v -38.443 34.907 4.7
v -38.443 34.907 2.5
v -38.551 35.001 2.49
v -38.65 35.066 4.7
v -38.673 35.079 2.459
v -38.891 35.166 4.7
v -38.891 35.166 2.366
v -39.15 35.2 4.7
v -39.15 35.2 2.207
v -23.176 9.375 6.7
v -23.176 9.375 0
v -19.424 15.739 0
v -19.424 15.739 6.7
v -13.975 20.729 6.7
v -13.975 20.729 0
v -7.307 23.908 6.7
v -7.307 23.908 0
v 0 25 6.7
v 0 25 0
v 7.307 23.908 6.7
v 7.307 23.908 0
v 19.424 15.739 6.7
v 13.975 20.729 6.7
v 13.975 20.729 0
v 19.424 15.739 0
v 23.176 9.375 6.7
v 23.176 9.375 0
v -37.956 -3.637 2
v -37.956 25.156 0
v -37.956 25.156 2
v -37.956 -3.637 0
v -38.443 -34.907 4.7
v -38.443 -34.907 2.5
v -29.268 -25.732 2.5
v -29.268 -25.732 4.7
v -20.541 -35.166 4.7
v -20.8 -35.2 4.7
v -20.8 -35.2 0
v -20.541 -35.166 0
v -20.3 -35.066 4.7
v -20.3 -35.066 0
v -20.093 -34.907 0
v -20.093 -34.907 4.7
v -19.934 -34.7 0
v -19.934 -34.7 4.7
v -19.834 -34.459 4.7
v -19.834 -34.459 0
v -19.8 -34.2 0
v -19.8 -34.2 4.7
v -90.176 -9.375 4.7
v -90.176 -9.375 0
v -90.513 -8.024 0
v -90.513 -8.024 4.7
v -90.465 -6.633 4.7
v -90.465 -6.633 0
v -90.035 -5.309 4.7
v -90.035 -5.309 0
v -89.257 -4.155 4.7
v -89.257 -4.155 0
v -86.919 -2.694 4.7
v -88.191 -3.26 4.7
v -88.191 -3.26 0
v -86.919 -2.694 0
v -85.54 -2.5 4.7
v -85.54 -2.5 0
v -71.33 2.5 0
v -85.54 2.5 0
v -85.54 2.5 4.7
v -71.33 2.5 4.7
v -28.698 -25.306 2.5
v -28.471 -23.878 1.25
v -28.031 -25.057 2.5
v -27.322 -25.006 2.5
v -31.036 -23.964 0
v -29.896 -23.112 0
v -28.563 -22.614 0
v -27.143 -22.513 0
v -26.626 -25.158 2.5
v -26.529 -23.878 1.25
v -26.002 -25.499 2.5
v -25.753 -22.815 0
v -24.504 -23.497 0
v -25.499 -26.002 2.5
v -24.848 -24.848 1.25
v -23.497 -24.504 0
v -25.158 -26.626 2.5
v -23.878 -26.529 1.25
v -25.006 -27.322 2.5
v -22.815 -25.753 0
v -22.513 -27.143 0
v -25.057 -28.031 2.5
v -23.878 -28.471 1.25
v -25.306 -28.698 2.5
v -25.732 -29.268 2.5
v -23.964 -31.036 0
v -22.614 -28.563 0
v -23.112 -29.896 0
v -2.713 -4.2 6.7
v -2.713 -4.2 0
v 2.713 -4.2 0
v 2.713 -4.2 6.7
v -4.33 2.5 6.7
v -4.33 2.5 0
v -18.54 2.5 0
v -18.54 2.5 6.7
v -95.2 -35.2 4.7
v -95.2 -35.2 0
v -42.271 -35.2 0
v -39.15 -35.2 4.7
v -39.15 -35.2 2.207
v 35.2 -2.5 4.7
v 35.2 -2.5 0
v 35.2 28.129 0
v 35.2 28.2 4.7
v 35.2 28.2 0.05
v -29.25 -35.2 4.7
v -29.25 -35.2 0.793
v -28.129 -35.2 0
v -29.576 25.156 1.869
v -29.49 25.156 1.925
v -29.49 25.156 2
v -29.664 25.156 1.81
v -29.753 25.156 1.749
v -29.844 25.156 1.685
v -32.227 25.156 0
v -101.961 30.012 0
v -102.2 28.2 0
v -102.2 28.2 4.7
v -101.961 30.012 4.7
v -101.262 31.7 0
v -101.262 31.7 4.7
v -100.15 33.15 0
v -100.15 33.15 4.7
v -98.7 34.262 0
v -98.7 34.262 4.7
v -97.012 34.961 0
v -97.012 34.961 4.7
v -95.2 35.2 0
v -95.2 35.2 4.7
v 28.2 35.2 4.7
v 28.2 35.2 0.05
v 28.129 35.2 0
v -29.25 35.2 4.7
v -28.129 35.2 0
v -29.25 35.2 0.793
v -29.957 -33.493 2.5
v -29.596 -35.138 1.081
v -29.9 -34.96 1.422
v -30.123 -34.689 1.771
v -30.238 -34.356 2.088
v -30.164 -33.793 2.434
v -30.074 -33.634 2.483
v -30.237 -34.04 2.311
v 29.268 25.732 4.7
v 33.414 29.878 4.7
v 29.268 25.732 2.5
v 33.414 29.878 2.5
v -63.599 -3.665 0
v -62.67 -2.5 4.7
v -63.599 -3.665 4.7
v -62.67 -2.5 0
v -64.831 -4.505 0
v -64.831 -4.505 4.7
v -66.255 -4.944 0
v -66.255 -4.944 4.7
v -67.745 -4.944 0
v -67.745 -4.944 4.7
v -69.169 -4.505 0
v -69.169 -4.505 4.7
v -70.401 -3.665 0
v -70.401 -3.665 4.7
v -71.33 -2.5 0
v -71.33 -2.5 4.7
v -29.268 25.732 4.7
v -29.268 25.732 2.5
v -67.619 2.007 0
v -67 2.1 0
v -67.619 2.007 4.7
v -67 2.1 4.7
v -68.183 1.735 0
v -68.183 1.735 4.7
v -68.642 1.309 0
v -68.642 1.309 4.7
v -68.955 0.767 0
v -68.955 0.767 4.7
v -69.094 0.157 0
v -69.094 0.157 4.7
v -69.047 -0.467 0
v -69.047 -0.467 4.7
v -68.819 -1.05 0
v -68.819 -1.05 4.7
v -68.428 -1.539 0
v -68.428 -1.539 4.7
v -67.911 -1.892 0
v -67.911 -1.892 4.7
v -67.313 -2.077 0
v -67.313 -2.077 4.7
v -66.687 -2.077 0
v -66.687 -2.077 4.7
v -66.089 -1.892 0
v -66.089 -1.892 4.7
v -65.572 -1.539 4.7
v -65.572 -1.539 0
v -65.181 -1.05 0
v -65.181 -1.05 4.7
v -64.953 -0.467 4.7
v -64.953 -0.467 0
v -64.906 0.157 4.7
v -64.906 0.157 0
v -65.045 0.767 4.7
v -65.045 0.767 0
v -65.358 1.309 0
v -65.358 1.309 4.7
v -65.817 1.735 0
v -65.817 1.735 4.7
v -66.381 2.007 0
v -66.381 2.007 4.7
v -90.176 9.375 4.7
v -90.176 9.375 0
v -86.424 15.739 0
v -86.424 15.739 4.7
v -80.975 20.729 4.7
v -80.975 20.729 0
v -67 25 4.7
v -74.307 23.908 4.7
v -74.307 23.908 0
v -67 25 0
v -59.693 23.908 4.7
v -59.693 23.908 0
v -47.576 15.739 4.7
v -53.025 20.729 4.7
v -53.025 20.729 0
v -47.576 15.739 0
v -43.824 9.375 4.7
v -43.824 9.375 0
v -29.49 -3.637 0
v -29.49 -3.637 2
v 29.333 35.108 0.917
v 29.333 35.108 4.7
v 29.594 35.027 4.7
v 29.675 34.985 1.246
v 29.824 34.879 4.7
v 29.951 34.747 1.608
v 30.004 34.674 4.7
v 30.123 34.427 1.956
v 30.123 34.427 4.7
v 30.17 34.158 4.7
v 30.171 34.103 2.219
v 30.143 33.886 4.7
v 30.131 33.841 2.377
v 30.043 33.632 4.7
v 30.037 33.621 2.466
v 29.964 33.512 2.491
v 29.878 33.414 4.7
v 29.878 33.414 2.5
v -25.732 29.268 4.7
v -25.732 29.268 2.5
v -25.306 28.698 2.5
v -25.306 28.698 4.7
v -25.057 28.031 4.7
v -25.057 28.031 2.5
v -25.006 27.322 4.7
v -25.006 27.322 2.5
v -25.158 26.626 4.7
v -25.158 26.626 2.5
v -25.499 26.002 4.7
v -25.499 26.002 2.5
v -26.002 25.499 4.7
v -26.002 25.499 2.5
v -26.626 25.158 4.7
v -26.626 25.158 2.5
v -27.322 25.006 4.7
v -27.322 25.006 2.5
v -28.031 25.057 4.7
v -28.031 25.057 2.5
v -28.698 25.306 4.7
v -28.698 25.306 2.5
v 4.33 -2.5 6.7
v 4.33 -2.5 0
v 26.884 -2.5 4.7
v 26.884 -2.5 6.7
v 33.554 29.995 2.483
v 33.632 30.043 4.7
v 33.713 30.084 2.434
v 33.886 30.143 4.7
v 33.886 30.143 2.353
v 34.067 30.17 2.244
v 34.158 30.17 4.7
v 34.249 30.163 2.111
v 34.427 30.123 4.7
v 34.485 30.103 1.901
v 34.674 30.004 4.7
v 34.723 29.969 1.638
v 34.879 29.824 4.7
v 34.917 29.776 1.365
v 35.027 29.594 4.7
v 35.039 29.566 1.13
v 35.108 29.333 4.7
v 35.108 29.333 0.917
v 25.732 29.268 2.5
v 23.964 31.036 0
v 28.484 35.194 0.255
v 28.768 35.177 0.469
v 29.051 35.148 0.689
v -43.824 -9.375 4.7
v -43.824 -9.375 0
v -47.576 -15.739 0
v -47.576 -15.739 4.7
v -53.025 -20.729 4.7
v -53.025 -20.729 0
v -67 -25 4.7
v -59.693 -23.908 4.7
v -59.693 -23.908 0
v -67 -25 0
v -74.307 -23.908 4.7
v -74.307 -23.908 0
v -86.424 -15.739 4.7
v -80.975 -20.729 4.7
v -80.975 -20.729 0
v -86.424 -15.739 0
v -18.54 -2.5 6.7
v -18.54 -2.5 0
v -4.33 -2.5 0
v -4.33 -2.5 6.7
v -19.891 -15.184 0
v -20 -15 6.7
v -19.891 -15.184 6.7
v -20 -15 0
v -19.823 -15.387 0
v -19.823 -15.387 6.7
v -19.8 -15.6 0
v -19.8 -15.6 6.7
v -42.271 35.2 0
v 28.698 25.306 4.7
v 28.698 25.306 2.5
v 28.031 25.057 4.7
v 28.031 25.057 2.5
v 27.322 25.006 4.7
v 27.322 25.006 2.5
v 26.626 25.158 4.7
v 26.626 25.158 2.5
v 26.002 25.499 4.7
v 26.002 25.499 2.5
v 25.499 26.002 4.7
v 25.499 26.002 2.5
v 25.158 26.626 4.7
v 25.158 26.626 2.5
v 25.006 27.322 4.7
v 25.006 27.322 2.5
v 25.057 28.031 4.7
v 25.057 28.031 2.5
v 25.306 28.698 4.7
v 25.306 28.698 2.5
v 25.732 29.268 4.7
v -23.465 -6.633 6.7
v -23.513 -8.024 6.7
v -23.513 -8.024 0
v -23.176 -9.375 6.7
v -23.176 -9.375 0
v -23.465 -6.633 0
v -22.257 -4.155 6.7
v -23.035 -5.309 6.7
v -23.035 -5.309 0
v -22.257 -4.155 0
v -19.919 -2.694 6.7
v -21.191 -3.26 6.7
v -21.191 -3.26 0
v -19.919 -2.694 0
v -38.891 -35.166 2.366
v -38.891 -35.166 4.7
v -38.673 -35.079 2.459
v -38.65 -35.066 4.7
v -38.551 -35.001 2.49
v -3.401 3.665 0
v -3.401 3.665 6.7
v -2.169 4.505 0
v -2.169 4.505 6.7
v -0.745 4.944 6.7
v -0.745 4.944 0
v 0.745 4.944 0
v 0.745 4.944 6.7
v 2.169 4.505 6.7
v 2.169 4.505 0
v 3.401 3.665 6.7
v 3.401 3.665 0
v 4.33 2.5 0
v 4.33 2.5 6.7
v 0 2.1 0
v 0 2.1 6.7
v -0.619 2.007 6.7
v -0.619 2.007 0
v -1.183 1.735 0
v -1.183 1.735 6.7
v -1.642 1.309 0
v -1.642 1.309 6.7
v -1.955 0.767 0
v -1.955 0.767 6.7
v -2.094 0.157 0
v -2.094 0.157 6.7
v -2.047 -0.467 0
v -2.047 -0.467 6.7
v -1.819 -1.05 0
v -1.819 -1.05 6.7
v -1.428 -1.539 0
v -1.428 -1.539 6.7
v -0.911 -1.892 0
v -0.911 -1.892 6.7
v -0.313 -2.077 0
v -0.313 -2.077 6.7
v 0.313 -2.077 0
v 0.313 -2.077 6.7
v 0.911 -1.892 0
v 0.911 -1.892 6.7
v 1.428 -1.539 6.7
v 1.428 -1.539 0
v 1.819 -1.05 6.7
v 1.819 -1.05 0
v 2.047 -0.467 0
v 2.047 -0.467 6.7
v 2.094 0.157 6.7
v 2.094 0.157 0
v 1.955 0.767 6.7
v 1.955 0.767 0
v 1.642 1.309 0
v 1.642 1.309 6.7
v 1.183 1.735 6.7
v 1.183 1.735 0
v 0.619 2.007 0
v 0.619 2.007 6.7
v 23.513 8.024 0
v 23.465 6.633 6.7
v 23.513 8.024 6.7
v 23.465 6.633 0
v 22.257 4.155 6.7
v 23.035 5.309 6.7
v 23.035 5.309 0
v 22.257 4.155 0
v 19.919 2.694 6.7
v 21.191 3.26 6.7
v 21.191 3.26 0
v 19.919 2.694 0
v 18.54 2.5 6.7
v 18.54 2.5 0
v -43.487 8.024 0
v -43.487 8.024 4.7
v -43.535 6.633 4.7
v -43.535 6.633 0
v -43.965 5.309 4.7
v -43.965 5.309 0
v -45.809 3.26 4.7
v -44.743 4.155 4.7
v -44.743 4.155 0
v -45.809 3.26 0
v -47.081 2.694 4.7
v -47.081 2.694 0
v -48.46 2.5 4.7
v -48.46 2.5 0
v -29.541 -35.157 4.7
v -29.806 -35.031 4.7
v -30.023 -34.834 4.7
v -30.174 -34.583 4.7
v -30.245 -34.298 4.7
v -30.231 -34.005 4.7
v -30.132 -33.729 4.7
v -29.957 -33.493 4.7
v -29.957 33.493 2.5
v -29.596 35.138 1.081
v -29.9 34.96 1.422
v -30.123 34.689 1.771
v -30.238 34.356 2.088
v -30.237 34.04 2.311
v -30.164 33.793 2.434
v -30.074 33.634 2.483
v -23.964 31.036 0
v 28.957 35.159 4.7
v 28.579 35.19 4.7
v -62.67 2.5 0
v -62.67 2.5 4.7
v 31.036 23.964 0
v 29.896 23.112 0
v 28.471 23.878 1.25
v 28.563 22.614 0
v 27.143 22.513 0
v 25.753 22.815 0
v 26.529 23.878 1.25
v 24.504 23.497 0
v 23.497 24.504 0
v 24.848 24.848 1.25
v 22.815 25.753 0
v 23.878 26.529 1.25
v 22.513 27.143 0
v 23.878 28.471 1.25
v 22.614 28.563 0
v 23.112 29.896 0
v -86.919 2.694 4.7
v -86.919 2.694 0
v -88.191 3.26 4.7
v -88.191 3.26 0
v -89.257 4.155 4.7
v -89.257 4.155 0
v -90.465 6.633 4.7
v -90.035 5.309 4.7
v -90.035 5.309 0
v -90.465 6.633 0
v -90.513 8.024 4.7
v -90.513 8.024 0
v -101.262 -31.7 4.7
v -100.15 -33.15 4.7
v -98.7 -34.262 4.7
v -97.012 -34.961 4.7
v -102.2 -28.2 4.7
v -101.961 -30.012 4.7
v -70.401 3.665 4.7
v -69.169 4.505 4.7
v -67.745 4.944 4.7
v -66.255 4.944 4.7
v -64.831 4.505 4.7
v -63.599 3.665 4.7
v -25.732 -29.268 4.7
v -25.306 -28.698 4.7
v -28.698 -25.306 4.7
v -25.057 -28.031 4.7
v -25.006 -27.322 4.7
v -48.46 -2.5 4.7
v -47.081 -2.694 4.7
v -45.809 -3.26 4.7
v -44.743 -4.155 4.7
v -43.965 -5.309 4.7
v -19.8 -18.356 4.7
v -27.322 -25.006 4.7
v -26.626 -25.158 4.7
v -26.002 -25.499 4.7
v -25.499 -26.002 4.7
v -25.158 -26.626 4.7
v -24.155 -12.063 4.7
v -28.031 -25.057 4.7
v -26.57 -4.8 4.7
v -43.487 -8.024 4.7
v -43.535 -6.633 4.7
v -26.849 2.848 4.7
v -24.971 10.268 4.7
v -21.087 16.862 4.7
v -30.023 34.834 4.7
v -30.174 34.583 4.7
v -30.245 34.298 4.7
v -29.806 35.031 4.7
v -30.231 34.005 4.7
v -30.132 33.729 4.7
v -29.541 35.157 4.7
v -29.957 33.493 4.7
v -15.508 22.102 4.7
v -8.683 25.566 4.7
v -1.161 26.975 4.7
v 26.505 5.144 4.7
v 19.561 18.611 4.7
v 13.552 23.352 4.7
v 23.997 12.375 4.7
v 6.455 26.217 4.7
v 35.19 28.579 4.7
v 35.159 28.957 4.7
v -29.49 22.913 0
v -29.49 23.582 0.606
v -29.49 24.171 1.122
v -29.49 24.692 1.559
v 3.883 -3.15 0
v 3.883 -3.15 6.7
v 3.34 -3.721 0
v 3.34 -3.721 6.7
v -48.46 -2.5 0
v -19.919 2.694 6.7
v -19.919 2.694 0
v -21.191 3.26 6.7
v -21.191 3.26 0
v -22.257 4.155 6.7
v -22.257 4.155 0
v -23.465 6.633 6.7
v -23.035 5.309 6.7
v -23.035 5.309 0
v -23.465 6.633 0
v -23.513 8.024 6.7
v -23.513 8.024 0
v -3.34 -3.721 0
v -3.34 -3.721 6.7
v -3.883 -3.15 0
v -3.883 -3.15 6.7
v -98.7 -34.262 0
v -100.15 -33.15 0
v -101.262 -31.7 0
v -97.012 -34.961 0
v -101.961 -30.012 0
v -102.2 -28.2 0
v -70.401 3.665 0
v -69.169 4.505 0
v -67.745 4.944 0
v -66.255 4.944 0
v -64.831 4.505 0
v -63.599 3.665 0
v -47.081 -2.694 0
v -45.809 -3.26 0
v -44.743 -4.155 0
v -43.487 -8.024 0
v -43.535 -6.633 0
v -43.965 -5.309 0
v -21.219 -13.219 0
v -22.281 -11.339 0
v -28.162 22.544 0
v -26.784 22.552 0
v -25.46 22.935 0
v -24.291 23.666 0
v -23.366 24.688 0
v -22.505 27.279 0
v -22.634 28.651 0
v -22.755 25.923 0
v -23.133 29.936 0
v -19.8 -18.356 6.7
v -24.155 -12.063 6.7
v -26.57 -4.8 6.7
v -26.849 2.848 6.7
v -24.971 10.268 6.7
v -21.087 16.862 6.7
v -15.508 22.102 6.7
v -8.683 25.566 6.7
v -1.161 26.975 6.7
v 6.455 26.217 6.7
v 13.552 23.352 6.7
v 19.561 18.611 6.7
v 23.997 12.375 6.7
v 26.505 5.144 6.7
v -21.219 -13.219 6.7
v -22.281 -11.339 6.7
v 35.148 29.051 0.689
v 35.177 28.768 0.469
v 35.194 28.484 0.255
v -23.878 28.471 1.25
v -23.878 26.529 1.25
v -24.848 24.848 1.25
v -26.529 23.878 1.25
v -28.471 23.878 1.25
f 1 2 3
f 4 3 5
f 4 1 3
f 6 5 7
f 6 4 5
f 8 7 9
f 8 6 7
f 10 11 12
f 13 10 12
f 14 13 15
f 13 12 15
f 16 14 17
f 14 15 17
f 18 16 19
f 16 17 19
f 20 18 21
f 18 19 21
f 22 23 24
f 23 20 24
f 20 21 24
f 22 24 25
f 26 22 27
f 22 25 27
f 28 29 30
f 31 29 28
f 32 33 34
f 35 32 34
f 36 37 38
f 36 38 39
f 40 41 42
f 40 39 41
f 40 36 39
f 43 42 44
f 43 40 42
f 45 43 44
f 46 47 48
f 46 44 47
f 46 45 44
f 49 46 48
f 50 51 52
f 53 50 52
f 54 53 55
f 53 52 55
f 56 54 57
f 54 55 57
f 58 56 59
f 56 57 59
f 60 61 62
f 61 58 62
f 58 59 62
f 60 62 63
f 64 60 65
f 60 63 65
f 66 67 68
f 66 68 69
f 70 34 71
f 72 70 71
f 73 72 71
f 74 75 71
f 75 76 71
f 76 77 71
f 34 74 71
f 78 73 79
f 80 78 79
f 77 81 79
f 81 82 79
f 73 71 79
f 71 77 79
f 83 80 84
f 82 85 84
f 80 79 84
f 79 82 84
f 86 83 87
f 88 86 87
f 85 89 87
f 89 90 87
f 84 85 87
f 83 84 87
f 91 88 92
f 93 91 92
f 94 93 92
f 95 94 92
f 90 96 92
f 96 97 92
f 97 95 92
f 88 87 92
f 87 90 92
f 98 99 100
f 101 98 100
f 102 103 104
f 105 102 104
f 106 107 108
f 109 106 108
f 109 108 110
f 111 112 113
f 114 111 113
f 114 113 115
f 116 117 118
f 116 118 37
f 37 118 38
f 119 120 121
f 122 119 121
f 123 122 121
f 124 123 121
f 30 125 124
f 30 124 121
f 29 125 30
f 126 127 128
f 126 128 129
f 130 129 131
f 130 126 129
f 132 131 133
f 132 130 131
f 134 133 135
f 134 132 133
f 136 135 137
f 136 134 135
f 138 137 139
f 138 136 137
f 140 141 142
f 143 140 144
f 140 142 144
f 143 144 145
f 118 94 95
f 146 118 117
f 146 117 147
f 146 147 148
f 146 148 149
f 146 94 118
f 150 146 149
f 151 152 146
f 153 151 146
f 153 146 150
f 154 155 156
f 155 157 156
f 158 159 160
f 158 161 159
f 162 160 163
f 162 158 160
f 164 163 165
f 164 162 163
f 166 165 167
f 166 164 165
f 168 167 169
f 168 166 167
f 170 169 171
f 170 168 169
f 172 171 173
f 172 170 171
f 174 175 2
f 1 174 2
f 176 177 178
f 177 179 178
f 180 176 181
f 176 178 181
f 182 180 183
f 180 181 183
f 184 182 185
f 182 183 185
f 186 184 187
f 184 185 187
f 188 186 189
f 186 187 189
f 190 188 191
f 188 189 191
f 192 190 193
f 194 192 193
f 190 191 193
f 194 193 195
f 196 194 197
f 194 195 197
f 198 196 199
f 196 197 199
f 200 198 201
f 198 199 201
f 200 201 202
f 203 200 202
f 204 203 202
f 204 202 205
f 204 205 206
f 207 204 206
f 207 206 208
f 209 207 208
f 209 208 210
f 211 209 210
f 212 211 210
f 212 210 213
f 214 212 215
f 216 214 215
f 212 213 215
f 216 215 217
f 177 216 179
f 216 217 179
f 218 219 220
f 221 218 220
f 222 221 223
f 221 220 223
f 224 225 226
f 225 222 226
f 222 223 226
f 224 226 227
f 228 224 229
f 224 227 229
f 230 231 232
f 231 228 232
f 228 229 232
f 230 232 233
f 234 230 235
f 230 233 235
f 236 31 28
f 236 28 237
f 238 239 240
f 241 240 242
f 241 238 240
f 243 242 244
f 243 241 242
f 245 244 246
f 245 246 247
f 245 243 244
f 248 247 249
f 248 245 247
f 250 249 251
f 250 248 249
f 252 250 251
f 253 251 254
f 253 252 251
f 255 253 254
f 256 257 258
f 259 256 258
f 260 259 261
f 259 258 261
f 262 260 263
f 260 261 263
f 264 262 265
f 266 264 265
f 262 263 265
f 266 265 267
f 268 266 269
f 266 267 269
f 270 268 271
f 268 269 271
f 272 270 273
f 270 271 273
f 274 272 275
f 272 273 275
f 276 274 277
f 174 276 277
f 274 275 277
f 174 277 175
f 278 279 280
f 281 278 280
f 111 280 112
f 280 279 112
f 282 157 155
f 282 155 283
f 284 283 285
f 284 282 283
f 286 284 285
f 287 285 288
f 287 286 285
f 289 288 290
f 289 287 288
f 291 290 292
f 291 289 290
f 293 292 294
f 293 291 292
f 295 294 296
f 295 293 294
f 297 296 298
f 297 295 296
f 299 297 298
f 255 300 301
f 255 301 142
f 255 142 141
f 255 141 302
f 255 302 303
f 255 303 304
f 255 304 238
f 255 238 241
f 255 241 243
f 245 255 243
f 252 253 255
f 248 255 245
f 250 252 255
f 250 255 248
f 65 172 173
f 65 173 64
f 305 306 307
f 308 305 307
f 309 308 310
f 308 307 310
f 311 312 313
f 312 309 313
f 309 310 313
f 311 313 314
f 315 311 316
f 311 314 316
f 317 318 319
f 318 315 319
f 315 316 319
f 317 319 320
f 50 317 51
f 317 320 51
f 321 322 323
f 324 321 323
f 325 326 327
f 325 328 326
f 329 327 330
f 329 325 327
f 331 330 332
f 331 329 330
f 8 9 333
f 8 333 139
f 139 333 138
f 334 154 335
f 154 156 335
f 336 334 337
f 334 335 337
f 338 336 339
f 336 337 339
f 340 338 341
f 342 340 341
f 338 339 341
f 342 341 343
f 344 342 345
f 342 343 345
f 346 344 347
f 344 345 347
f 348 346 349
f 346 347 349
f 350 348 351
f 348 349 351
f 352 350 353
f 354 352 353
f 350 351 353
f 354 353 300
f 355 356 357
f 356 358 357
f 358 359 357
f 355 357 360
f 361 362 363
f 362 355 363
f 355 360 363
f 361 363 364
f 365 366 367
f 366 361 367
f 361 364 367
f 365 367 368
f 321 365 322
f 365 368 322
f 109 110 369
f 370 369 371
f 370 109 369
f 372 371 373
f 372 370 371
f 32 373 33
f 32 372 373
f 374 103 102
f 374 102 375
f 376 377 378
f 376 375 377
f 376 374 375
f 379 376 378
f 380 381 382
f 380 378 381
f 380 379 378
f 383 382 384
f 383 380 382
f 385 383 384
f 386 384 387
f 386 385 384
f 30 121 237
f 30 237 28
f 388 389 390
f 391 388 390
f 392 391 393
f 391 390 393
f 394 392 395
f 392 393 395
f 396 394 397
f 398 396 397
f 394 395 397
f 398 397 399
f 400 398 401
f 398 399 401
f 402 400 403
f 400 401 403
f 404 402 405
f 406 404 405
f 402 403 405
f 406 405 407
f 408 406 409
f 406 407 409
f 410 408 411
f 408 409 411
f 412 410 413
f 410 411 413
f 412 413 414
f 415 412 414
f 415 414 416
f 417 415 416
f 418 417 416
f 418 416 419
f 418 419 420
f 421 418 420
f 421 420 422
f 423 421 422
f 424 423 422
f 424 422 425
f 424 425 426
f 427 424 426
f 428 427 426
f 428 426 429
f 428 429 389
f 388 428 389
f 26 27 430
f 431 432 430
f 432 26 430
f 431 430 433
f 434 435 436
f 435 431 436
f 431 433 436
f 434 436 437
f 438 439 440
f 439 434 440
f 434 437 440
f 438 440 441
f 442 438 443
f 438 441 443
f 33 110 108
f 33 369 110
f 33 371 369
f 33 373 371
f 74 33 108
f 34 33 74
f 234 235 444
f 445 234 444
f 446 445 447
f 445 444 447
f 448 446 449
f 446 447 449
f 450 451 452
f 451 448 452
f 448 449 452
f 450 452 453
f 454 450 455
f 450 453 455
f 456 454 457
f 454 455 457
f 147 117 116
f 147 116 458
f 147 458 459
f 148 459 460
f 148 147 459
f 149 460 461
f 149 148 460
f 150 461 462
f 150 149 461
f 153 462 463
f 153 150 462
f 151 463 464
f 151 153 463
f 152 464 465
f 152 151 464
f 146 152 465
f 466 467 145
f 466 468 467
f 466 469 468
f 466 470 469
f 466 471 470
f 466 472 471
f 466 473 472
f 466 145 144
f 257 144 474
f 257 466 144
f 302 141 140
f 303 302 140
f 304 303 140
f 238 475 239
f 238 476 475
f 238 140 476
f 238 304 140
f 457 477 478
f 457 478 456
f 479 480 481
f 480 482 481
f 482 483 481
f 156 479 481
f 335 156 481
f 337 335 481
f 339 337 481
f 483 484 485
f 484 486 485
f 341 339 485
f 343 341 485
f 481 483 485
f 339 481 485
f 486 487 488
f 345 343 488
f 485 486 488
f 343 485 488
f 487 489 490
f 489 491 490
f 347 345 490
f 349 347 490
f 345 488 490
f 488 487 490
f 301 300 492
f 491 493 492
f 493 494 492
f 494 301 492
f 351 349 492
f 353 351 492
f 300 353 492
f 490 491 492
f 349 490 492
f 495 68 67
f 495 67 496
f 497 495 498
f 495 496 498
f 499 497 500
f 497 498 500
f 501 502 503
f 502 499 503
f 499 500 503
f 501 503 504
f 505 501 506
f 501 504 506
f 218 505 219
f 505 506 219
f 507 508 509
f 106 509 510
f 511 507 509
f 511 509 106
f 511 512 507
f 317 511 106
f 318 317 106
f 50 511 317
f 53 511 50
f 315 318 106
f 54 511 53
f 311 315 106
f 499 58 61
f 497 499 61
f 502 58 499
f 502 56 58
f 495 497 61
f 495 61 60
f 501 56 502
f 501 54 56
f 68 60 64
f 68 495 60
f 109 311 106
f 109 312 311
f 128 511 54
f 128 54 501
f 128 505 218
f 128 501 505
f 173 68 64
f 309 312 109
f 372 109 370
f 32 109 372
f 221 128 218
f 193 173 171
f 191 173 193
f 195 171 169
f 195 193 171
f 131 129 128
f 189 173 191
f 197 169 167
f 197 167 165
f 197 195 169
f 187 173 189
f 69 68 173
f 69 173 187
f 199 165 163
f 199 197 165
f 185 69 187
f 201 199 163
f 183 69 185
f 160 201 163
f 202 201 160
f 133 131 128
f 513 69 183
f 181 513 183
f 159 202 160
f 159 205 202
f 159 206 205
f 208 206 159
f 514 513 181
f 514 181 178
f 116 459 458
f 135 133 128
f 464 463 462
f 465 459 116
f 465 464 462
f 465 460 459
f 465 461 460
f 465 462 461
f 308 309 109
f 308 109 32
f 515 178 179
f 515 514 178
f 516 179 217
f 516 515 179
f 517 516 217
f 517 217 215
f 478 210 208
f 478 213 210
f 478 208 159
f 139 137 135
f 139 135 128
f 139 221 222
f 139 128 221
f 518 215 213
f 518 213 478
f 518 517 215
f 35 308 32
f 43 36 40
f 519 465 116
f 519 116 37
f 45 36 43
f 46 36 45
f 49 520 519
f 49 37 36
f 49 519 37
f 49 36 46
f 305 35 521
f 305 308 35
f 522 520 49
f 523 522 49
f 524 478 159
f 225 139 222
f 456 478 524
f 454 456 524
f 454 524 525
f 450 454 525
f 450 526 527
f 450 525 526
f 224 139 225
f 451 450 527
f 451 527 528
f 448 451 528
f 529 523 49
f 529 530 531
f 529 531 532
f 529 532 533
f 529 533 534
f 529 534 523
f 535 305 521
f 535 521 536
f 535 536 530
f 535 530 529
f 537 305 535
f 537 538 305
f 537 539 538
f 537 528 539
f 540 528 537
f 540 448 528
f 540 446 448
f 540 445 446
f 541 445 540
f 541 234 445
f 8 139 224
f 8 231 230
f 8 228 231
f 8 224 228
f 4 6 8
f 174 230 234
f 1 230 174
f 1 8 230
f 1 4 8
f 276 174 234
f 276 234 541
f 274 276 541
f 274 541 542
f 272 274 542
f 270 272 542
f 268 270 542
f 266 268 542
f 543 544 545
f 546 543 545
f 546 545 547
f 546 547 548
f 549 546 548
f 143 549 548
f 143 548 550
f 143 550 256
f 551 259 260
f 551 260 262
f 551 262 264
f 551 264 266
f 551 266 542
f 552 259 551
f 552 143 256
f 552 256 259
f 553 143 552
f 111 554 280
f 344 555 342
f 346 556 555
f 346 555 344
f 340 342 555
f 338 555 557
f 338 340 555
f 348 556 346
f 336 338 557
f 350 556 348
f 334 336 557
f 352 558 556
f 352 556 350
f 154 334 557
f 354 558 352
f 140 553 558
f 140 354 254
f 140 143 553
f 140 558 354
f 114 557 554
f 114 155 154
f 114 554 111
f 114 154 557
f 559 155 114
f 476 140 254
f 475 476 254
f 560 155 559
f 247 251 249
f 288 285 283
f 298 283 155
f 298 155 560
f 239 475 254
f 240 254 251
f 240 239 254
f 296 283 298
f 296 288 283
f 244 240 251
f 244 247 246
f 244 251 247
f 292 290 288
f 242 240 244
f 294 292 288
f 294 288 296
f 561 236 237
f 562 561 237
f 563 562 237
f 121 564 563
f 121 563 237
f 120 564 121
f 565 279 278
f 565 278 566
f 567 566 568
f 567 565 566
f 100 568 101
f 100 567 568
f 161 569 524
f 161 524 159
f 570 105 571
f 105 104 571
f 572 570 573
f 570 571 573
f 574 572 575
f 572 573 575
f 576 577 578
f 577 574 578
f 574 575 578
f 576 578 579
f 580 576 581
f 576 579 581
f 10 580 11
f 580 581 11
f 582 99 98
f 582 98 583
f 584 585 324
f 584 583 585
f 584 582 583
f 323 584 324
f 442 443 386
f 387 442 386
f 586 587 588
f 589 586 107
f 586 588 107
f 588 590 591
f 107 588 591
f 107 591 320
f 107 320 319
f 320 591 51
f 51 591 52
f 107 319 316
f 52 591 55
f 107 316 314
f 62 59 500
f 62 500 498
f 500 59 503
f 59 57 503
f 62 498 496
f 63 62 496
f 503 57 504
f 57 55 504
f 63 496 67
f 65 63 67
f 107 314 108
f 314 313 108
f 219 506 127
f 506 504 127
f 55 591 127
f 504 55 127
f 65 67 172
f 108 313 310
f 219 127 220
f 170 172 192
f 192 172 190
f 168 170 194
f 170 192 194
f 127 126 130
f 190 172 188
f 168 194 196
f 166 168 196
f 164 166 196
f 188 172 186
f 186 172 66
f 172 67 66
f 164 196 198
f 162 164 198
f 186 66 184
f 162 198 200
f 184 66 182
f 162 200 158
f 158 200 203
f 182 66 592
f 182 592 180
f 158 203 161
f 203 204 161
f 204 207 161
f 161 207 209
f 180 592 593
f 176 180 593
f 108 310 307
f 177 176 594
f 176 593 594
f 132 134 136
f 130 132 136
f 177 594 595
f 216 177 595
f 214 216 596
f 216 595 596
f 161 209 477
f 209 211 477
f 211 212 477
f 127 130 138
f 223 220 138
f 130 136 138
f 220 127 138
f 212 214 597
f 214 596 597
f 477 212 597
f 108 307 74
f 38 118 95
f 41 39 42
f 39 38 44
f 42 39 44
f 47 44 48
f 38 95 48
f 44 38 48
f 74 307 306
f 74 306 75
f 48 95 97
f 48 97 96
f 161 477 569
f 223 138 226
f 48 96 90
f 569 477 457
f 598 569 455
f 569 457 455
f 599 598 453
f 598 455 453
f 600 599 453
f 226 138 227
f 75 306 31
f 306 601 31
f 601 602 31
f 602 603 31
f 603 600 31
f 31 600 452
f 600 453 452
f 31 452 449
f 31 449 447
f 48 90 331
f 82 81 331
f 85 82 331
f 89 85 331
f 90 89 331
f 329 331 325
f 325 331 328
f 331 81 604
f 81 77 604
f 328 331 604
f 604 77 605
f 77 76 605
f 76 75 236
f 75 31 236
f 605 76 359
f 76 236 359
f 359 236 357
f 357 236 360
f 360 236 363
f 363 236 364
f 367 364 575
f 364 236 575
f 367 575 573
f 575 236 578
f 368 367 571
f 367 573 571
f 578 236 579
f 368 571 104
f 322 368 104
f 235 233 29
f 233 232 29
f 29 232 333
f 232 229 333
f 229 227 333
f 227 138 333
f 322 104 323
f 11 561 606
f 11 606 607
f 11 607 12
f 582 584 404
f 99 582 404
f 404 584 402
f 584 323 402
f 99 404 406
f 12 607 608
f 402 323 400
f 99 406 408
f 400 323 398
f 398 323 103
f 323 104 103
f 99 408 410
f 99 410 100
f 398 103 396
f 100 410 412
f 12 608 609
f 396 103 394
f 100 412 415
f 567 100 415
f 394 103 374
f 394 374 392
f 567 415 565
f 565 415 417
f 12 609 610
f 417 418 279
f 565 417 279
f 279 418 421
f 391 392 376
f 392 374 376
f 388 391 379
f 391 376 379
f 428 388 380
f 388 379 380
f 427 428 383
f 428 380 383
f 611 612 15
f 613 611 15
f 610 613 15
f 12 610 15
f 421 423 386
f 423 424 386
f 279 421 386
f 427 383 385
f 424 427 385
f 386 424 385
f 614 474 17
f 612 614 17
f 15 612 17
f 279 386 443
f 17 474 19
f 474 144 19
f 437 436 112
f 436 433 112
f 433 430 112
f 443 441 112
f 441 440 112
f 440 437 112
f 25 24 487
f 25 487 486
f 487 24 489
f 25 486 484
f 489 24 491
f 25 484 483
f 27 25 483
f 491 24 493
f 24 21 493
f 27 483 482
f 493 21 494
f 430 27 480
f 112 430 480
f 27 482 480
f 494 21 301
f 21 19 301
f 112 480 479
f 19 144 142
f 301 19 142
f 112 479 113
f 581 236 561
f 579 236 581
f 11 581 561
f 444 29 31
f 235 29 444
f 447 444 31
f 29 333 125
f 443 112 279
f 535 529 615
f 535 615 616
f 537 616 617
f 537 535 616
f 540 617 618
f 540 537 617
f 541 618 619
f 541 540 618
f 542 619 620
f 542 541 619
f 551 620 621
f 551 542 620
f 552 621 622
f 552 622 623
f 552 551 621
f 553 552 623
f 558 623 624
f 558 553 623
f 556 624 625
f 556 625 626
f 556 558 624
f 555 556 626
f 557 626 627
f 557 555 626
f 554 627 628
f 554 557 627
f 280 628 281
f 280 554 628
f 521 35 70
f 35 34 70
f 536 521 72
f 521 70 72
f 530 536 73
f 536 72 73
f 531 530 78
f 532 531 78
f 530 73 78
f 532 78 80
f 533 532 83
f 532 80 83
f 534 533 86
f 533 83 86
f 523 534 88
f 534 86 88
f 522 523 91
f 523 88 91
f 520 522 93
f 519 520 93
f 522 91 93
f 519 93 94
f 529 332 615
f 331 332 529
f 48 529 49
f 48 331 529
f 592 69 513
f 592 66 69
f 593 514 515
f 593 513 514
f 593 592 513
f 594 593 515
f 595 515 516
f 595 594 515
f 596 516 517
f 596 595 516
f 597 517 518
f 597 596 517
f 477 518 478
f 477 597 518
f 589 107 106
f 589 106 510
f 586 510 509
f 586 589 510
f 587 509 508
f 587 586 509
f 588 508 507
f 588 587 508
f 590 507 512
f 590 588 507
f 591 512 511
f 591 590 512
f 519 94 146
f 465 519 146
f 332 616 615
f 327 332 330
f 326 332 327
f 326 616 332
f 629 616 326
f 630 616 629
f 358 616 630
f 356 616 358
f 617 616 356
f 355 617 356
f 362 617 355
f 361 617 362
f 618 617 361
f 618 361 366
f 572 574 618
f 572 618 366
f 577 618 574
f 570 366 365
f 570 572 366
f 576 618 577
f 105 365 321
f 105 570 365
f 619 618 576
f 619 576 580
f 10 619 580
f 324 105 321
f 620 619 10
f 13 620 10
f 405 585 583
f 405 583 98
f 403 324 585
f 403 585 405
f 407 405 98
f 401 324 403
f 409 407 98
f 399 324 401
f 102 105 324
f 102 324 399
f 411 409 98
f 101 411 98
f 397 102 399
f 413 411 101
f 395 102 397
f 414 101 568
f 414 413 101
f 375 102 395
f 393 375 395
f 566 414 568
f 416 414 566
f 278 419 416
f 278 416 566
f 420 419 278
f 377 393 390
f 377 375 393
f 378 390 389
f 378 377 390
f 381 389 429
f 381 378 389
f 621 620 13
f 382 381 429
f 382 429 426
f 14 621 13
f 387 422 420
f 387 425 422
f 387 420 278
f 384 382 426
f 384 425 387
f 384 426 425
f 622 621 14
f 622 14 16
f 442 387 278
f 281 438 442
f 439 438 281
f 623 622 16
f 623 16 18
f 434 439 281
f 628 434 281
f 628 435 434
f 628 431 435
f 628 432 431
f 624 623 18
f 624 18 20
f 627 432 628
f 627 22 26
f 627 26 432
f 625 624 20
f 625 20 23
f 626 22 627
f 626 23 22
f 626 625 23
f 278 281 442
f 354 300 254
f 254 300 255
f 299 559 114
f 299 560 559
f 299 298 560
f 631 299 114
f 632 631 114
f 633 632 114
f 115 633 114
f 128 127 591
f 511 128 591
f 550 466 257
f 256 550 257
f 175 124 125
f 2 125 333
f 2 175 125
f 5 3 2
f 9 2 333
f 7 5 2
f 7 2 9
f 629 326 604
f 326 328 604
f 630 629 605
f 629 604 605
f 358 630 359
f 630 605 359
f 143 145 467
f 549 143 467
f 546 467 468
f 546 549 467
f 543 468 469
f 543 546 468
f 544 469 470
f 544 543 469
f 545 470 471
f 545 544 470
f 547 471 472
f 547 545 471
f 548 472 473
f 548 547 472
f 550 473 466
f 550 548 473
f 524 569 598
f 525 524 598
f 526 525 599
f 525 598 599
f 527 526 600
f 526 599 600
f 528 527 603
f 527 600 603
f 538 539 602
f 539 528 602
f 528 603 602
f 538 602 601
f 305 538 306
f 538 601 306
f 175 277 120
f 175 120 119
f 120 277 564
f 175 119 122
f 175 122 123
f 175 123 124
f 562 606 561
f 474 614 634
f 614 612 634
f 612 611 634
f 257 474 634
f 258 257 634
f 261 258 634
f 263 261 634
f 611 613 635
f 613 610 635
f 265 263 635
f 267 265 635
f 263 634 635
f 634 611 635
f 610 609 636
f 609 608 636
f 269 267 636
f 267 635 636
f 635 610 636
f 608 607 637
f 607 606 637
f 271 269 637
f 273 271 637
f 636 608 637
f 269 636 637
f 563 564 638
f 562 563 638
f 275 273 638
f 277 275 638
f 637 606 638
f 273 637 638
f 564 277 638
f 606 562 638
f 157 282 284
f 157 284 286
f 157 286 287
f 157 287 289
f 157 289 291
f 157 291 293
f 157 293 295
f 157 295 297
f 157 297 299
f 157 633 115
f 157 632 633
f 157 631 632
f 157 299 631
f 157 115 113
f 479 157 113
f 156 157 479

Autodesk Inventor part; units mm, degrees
ref_plane "YZ Plane" through (0, 0, 0) normal (1, 0, 0) x (0, 1, 0)
ref_plane "XZ Plane" through (0, 0, 0) normal (0, 1, 0) x (-1, 0, 0)
ref_plane "XY Plane" through (0, 0, 0) normal (0, 0, 1) x (1, 0, 0)
sketch "Sketch1" plane through (0, 0, 0) normal (0, 0, 1) x (1, 0, 0)
  line L0 (-95.2, -35.2) -> (28.2, -35.2)
  line L1 (35.2, -28.2) -> (35.2, 28.2)
  line L2 (28.2, 35.2) -> (-95.2, 35.2)
  line L3 (-102.2, 28.2) -> (-102.2, -28.2)
  arc A0 (-95.2, 35.2) -> (-102.2, 28.2) centre (-95.2, 28.2) ccw
  arc A1 (35.2, 28.2) -> (28.2, 35.2) centre (28.2, 28.2) ccw
  arc A2 (-102.2, -28.2) -> (-95.2, -35.2) centre (-95.2, -28.2) ccw
  arc A3 (28.2, -35.2) -> (35.2, -28.2) centre (28.2, -28.2) ccw
  line L4 (24.8747, -2.5) -> (24.8747, 2.5) construction
  line L5 (-24.8747, 2.5) -> (-24.8747, -2.5) construction
  line L6 (24.8747, -2.5) -> (-24.8747, 2.5) construction
  line L7 (24.8747, 2.5) -> (-24.8747, -2.5) construction
  arc A4 (-23.1756, -9.375) -> (23.1756, -9.375) centre (0, 0) ccw
  arc A5 (23.1756, 9.375) -> (-23.1756, 9.375) centre (0, 0) ccw
  arc A6 (-18.5405, -2.5) -> (-23.1756, -9.375) centre (-18.5405, -7.5) ccw
  arc A7 (-23.1756, 9.375) -> (-18.5405, 2.5) centre (-18.5405, 7.5) ccw
  arc A8 (23.1756, -9.375) -> (18.5405, -2.5) centre (18.5405, -7.5) ccw
  arc A9 (18.5405, 2.5) -> (23.1756, 9.375) centre (18.5405, 7.5) ccw
  line L8 (-4.3301, 2.5) -> (-18.5405, 2.5)
  line L9 (-18.5405, -2.5) -> (-4.3301, -2.5)
  line L10 (4.3301, -2.5) -> (18.5405, -2.5)
  line L11 (18.5405, 2.5) -> (4.3301, 2.5)
  arc A10 (-4.3301, -2.5) -> (4.3301, -2.5) centre (0, 0) ccw
  arc A11 (4.3301, 2.5) -> (-4.3301, 2.5) centre (0, 0) ccw
  line L12 (-18.5405, 7.5) -> (18.5405, 7.5) construction
  line L13 (18.5405, -7.5) -> (-18.5405, -7.5) construction
  line L14 (0, 0) -> (0, -35.2) construction
  line L15 (0, 0) -> (0, 35.2) construction
  line L16 (0, 0) -> (35.2, 0) construction
  line L17 (-33.5, -35.2) -> (-33.5, 35.2) construction
  arc A12 (-90.1756, -9.375) -> (-43.8244, -9.375) centre (-67, 0) ccw
  arc A13 (-43.8244, 9.375) -> (-90.1756, 9.375) centre (-67, 0) ccw
  arc A14 (-43.8244, -9.375) -> (-48.4595, -2.5) centre (-48.4595, -7.5) ccw
  arc A15 (-48.4595, 2.5) -> (-43.8244, 9.375) centre (-48.4595, 7.5) ccw
  arc A16 (-85.5405, -2.5) -> (-90.1756, -9.375) centre (-85.5405, -7.5) ccw
  arc A17 (-90.1756, 9.375) -> (-85.5405, 2.5) centre (-85.5405, 7.5) ccw
  line L18 (-62.6699, 2.5) -> (-48.4595, 2.5)
  line L19 (-48.4595, -2.5) -> (-62.6699, -2.5)
  line L20 (-71.3301, -2.5) -> (-85.5405, -2.5)
  line L21 (-85.5405, 2.5) -> (-71.3301, 2.5)
  arc A18 (-71.3301, -2.5) -> (-62.6699, -2.5) centre (-67, 0) ccw
  arc A19 (-62.6699, 2.5) -> (-71.3301, 2.5) centre (-67, 0) ccw
  point P0 (0, 0)
  point P1 (0, 0)
  dimension "d63" = 67
  dimension "d1" = 7
  dimension "d3" = 5
  dimension "d4" = 25
  dimension "d5" = 5
  dimension "d7" = 5
  dimension "d59" = 70.4
  dimension "d60" = 137.4
extrude "Extrusion1" add sketch "Sketch1" along normal blind 4.7
sketch "Sketch2" plane through (0, 0, 4.7) normal (0, 0, 1) x (1, 0, 0)
  circle A0 centre (0, 0) radius 27
  arc A1 (23.1756, 9.375) -> (-23.1756, 9.375) centre (0, 0) ccw projected
  arc A2 (18.5405, 2.5) -> (23.1756, 9.375) centre (18.5405, 7.5) ccw projected
  line L0 (18.5405, 2.5) -> (4.3301, 2.5) projected
  arc A3 (4.3301, 2.5) -> (-4.3301, 2.5) centre (0, 0) ccw projected
  line L1 (-4.3301, 2.5) -> (-18.5405, 2.5) projected
  arc A4 (-23.1756, 9.375) -> (-18.5405, 2.5) centre (-18.5405, 7.5) ccw projected
  line L2 (-18.5405, -2.5) -> (-4.3301, -2.5) projected
  arc A5 (-4.3301, -2.5) -> (4.3301, -2.5) centre (0, 0) ccw projected
  line L3 (4.3301, -2.5) -> (18.5405, -2.5) projected
  arc A6 (23.1756, -9.375) -> (18.5405, -2.5) centre (18.5405, -7.5) ccw projected
  arc A7 (-23.1756, -9.375) -> (23.1756, -9.375) centre (0, 0) ccw projected
  arc A8 (-18.5405, -2.5) -> (-23.1756, -9.375) centre (-18.5405, -7.5) ccw projected
  line L4 (28.2, 35.2) -> (-95.2, 35.2) projected
  arc A9 (-95.2, 35.2) -> (-102.2, 28.2) centre (-95.2, 28.2) ccw projected
  line L5 (-102.2, 28.2) -> (-102.2, -28.2) projected
  arc A10 (-102.2, -28.2) -> (-95.2, -35.2) centre (-95.2, -28.2) ccw projected
  line L6 (-95.2, -35.2) -> (28.2, -35.2) projected
  arc A11 (28.2, -35.2) -> (35.2, -28.2) centre (28.2, -28.2) ccw projected
  line L7 (35.2, -28.2) -> (35.2, 28.2) projected
  arc A12 (35.2, 28.2) -> (28.2, 35.2) centre (28.2, 28.2) ccw projected
  dimension "d10" = 54
extrude "Extrusion2" add sketch "Sketch2" along normal blind 2 contours A0
sketch "Sketch3" plane through (0, 0, 0) normal (0, 0, -1) x (-1, 0, 0)
  line L0 (-27.5, -27.5) -> (27.5, -27.5) construction
  line L1 (27.5, -27.5) -> (27.5, 27.5) construction
  line L2 (27.5, 27.5) -> (-27.5, 27.5) construction
  line L3 (-27.5, 27.5) -> (-27.5, -27.5) construction
  line L4 (-27.5, -27.5) -> (27.5, 27.5) construction
  line L5 (27.5, -27.5) -> (-27.5, 27.5) construction
  line L6 (-27.5, 27.5) -> (-36.9678, 36.9678) construction
  line L7 (-25.7322, 29.2678) -> (-35.2, 38.7355)
  line L8 (-38.7355, 35.2) -> (-29.2678, 25.7322)
  arc A0 (-29.2678, 25.7322) -> (-25.7322, 29.2678) centre (-27.5, 27.5) ccw
  arc A1 (-35.2, 38.7355) -> (-38.7355, 35.2) centre (-36.9678, 36.9678) ccw
  line L9 (95.2, 35.2) -> (-28.2, 35.2) construction
  arc A2 (-38.7355, -35.2) -> (-35.2, -38.7355) centre (-36.9678, -36.9678) ccw
  line L10 (-29.2678, -25.7322) -> (-38.7355, -35.2)
  line L11 (-35.2, -38.7355) -> (-25.7322, -29.2678)
  arc A3 (-25.7322, -29.2678) -> (-29.2678, -25.7322) centre (-27.5, -27.5) ccw
  arc A4 (35.2, -38.7355) -> (38.7355, -35.2) centre (36.9678, -36.9678) ccw
  line L12 (25.7322, -29.2678) -> (35.2, -38.7355)
  line L13 (38.7355, -35.2) -> (29.2678, -25.7322)
  arc A5 (29.2678, -25.7322) -> (25.7322, -29.2678) centre (27.5, -27.5) ccw
  arc A6 (38.7355, 35.2) -> (35.2, 38.7355) centre (36.9678, 36.9678) ccw
  line L14 (29.2678, 25.7322) -> (38.7355, 35.2)
  line L15 (35.2, 38.7355) -> (25.7322, 29.2678)
  arc A7 (25.7322, 29.2678) -> (29.2678, 25.7322) centre (27.5, 27.5) ccw
  arc A8 (62.6699, -2.5) -> (71.3301, -2.5) centre (67, 0) ccw construction
  line L16 (67, 0) -> (0, 0) construction
  line L17 (134, 0) -> (67, 0) construction
  arc A9 (92.7322, 29.2678) -> (96.2678, 25.7322) centre (94.5, 27.5) ccw
  line L18 (96.2678, 25.7322) -> (105.7355, 35.2)
  arc A10 (105.7355, 35.2) -> (102.2, 38.7355) centre (103.9678, 36.9678) ccw
  line L19 (102.2, 38.7355) -> (92.7322, 29.2678)
  line L20 (28.2645, 35.2) -> (37.7322, 25.7322)
  arc A11 (37.7322, 25.7322) -> (41.2678, 29.2678) centre (39.5, 27.5) ccw
  line L21 (41.2678, 29.2678) -> (31.8, 38.7355)
  arc A12 (31.8, 38.7355) -> (28.2645, 35.2) centre (30.0322, 36.9678) ccw
  line L22 (31.8, -38.7355) -> (41.2678, -29.2678)
  arc A13 (41.2678, -29.2678) -> (37.7322, -25.7322) centre (39.5, -27.5) ccw
  line L23 (37.7322, -25.7322) -> (28.2645, -35.2)
  arc A14 (28.2645, -35.2) -> (31.8, -38.7355) centre (30.0322, -36.9678) ccw
  line L24 (105.7355, -35.2) -> (96.2678, -25.7322)
  arc A15 (96.2678, -25.7322) -> (92.7322, -29.2678) centre (94.5, -27.5) ccw
  line L25 (92.7322, -29.2678) -> (102.2, -38.7355)
  arc A16 (102.2, -38.7355) -> (105.7355, -35.2) centre (103.9678, -36.9678) ccw
  point P0 (-32.2339, 32.2339)
  point P1 (129.6699, -2.5)
  point P2 (138.3301, -2.5)
  dimension "d68" = 55
  dimension "d70" = 5
  dimension "d73" = 360
  dimension "d211" = 67
  dimension "d214" = 67
  dimension "d221" = 360
extrude "Extrusion3" cut sketch "Sketch3" against normal through all contours A0 L8 A1 L7 | L10 A3 L11 A2 | L12 L22 L13 A4 | L12 L23 L13 L22 | L12 A5 L13 L23 | L14 L21 L15 A6 | L14 L20 L15 L21 | L14 A7 L15 L20
chamfer "Chamfer1" distance 2.5 angle 45 12 edges at (28.3939, 31.9294, 0) (25.7322, 25.7322, 0) (31.9294, 28.3939, 0) (-28.6983, 32.2339, 0) (-25.7322, 25.7322, 0) (-34.0017, 30.4661, 0) (-25.7322, -25.7322, 0) (-34.0017, -30.4661, 0) (-28.6983, -32.2339, 0) (25.7322, -25.7322, 0) (28.3939, -31.9294, 0) (31.9294, -28.3939, 0)
fillet "Fillet1" radius 1 8 edges at (34.5911, -31.0555, 3.6) (31.0555, -34.5911, 3.6) (31.0555, 34.5911, 3.6) (34.5911, 31.0555, 3.6) (-31.6645, 35.2, 3.6) (-38.7355, 35.2, 3.6) (-31.6645, -35.2, 3.6) (-38.7355, -35.2, 3.6)
sketch "Sketch7" plane through (0, 0, 0) normal (0, 0, -1) x (-1, 0, 0)
  arc A0 (-4.3301, -2.5) -> (4.3301, -2.5) centre (0, 0) ccw construction
  arc A1 (62.6699, -2.5) -> (71.3301, -2.5) centre (67, 0) ccw projected
  point P0 (0, 0)
hole "Hole2" at (0, 0, 0) at (-67, 0, 0) direction (0, 0, 1) diameter 4.2 end through all
sketch "Sketch4" plane through (0, 0, 0) normal (0, 0, -1) x (-1, 0, 0)
  line L0 (19.8, -4.2) -> (19.8, -35.2)
  line L1 (19.8, -35.2) -> (-35.2, -35.2)
  line L2 (-35.2, -35.2) -> (-35.2, -4.2)
  line L3 (19.8, -4.2) -> (-35.2, -4.2)
  line L4 (102.2, -35.2) -> (-35.2, -35.2) construction
  line L5 (-35.2, -35.2) -> (-35.2, 35.2) construction
  line L6 (-35.2, 35.2) -> (102.2, 35.2) construction
  line L7 (102.2, 35.2) -> (102.2, -35.2) construction
  line L8 (28.1289, 35.2) -> (42.2711, 35.2) construction
  line L9 (-35.2, 28.1289) -> (-35.2, -28.1289) construction
  line L10 (-28.2, -35.2) -> (28.1289, -35.2) construction
  line L11 (102.2, -28.2) -> (102.2, 28.2) construction
  line L12 (-4.3301, -2.5) -> (-18.5405, -2.5) projected
  line L13 (-4.3301, -2.5) -> (-35.2, -2.5)
  line L14 (-35.2, -2.5) -> (-35.2, -4.2)
  line L15 (-35.2, -4.2) -> (-4.3301, -4.2)
  line L16 (-4.3301, -4.2) -> (-4.3301, -2.5)
  point P0 (-28.1289, 35.2)
  point P1 (-28.1289, -35.2)
  dimension "d39" = 31
  dimension "d41" = 55
extrude "Extrusion4" cut sketch "Sketch4" against normal through all
fillet "Fillet2" radius 1 2 edges at (-19.8, -15.263, 3.35) (-19.8, -35.2, 2.35)
sketch "Sketch8" plane through (0, 0, 0) normal (0, 0, -1) x (-1, 0, 0)
  line L0 (0, 0) -> (35.5, 0) construction
  line L1 (35.5, 0) -> (71, 0) construction
  line L2 (32.5, 32.5) -> (32.5, -32.5) construction
  line L3 (32.5, -32.5) -> (-32.5, -32.5) construction
  line L4 (-32.5, -32.5) -> (-32.5, 32.5) construction
  line L5 (-32.5, 32.5) -> (32.5, 32.5) construction
  line L6 (99.5, 32.5) -> (99.5, -32.5) construction
  line L7 (99.5, -32.5) -> (34.5, -32.5) construction
  line L8 (34.5, -32.5) -> (34.5, 32.5) construction
  line L9 (34.5, 32.5) -> (99.5, 32.5) construction
  line L10 (96.3694, 32.5) -> (96.3694, 35.2) construction
  line L11 (99.5, 26.6962) -> (102.2, 26.6962) construction
  line L12 (92.7868, -32.5) -> (92.7868, -35.2) construction
  line L13 (102.2, -28.2) -> (102.2, 28.2) construction
  line L14 (42.2711, -35.2) -> (95.2, -35.2) construction
  line L15 (-35.2, -1.5) -> (-35.2, 28.2) construction
  line L16 (-35.2, 21.6184) -> (-32.5, 21.6184) construction
  line L17 (95.2, 35.2) -> (42.2711, 35.2) construction
  line L18 (29.4901, 25.1562) -> (37.9558, 25.1562)
  line L19 (37.9558, 25.1562) -> (37.9558, -3.6366)
  line L20 (37.9558, -3.6366) -> (29.4901, -3.6366)
  line L21 (29.4901, -3.6366) -> (29.4901, 25.1562)
  dimension "d131" = 65
extrude "Extrusion6" cut sketch "Sketch8" against normal blind 2
equation "\"Offset\" = 0.3"
equation "\"d56\" = 0.3"
properties part number "V4 in walldual"
